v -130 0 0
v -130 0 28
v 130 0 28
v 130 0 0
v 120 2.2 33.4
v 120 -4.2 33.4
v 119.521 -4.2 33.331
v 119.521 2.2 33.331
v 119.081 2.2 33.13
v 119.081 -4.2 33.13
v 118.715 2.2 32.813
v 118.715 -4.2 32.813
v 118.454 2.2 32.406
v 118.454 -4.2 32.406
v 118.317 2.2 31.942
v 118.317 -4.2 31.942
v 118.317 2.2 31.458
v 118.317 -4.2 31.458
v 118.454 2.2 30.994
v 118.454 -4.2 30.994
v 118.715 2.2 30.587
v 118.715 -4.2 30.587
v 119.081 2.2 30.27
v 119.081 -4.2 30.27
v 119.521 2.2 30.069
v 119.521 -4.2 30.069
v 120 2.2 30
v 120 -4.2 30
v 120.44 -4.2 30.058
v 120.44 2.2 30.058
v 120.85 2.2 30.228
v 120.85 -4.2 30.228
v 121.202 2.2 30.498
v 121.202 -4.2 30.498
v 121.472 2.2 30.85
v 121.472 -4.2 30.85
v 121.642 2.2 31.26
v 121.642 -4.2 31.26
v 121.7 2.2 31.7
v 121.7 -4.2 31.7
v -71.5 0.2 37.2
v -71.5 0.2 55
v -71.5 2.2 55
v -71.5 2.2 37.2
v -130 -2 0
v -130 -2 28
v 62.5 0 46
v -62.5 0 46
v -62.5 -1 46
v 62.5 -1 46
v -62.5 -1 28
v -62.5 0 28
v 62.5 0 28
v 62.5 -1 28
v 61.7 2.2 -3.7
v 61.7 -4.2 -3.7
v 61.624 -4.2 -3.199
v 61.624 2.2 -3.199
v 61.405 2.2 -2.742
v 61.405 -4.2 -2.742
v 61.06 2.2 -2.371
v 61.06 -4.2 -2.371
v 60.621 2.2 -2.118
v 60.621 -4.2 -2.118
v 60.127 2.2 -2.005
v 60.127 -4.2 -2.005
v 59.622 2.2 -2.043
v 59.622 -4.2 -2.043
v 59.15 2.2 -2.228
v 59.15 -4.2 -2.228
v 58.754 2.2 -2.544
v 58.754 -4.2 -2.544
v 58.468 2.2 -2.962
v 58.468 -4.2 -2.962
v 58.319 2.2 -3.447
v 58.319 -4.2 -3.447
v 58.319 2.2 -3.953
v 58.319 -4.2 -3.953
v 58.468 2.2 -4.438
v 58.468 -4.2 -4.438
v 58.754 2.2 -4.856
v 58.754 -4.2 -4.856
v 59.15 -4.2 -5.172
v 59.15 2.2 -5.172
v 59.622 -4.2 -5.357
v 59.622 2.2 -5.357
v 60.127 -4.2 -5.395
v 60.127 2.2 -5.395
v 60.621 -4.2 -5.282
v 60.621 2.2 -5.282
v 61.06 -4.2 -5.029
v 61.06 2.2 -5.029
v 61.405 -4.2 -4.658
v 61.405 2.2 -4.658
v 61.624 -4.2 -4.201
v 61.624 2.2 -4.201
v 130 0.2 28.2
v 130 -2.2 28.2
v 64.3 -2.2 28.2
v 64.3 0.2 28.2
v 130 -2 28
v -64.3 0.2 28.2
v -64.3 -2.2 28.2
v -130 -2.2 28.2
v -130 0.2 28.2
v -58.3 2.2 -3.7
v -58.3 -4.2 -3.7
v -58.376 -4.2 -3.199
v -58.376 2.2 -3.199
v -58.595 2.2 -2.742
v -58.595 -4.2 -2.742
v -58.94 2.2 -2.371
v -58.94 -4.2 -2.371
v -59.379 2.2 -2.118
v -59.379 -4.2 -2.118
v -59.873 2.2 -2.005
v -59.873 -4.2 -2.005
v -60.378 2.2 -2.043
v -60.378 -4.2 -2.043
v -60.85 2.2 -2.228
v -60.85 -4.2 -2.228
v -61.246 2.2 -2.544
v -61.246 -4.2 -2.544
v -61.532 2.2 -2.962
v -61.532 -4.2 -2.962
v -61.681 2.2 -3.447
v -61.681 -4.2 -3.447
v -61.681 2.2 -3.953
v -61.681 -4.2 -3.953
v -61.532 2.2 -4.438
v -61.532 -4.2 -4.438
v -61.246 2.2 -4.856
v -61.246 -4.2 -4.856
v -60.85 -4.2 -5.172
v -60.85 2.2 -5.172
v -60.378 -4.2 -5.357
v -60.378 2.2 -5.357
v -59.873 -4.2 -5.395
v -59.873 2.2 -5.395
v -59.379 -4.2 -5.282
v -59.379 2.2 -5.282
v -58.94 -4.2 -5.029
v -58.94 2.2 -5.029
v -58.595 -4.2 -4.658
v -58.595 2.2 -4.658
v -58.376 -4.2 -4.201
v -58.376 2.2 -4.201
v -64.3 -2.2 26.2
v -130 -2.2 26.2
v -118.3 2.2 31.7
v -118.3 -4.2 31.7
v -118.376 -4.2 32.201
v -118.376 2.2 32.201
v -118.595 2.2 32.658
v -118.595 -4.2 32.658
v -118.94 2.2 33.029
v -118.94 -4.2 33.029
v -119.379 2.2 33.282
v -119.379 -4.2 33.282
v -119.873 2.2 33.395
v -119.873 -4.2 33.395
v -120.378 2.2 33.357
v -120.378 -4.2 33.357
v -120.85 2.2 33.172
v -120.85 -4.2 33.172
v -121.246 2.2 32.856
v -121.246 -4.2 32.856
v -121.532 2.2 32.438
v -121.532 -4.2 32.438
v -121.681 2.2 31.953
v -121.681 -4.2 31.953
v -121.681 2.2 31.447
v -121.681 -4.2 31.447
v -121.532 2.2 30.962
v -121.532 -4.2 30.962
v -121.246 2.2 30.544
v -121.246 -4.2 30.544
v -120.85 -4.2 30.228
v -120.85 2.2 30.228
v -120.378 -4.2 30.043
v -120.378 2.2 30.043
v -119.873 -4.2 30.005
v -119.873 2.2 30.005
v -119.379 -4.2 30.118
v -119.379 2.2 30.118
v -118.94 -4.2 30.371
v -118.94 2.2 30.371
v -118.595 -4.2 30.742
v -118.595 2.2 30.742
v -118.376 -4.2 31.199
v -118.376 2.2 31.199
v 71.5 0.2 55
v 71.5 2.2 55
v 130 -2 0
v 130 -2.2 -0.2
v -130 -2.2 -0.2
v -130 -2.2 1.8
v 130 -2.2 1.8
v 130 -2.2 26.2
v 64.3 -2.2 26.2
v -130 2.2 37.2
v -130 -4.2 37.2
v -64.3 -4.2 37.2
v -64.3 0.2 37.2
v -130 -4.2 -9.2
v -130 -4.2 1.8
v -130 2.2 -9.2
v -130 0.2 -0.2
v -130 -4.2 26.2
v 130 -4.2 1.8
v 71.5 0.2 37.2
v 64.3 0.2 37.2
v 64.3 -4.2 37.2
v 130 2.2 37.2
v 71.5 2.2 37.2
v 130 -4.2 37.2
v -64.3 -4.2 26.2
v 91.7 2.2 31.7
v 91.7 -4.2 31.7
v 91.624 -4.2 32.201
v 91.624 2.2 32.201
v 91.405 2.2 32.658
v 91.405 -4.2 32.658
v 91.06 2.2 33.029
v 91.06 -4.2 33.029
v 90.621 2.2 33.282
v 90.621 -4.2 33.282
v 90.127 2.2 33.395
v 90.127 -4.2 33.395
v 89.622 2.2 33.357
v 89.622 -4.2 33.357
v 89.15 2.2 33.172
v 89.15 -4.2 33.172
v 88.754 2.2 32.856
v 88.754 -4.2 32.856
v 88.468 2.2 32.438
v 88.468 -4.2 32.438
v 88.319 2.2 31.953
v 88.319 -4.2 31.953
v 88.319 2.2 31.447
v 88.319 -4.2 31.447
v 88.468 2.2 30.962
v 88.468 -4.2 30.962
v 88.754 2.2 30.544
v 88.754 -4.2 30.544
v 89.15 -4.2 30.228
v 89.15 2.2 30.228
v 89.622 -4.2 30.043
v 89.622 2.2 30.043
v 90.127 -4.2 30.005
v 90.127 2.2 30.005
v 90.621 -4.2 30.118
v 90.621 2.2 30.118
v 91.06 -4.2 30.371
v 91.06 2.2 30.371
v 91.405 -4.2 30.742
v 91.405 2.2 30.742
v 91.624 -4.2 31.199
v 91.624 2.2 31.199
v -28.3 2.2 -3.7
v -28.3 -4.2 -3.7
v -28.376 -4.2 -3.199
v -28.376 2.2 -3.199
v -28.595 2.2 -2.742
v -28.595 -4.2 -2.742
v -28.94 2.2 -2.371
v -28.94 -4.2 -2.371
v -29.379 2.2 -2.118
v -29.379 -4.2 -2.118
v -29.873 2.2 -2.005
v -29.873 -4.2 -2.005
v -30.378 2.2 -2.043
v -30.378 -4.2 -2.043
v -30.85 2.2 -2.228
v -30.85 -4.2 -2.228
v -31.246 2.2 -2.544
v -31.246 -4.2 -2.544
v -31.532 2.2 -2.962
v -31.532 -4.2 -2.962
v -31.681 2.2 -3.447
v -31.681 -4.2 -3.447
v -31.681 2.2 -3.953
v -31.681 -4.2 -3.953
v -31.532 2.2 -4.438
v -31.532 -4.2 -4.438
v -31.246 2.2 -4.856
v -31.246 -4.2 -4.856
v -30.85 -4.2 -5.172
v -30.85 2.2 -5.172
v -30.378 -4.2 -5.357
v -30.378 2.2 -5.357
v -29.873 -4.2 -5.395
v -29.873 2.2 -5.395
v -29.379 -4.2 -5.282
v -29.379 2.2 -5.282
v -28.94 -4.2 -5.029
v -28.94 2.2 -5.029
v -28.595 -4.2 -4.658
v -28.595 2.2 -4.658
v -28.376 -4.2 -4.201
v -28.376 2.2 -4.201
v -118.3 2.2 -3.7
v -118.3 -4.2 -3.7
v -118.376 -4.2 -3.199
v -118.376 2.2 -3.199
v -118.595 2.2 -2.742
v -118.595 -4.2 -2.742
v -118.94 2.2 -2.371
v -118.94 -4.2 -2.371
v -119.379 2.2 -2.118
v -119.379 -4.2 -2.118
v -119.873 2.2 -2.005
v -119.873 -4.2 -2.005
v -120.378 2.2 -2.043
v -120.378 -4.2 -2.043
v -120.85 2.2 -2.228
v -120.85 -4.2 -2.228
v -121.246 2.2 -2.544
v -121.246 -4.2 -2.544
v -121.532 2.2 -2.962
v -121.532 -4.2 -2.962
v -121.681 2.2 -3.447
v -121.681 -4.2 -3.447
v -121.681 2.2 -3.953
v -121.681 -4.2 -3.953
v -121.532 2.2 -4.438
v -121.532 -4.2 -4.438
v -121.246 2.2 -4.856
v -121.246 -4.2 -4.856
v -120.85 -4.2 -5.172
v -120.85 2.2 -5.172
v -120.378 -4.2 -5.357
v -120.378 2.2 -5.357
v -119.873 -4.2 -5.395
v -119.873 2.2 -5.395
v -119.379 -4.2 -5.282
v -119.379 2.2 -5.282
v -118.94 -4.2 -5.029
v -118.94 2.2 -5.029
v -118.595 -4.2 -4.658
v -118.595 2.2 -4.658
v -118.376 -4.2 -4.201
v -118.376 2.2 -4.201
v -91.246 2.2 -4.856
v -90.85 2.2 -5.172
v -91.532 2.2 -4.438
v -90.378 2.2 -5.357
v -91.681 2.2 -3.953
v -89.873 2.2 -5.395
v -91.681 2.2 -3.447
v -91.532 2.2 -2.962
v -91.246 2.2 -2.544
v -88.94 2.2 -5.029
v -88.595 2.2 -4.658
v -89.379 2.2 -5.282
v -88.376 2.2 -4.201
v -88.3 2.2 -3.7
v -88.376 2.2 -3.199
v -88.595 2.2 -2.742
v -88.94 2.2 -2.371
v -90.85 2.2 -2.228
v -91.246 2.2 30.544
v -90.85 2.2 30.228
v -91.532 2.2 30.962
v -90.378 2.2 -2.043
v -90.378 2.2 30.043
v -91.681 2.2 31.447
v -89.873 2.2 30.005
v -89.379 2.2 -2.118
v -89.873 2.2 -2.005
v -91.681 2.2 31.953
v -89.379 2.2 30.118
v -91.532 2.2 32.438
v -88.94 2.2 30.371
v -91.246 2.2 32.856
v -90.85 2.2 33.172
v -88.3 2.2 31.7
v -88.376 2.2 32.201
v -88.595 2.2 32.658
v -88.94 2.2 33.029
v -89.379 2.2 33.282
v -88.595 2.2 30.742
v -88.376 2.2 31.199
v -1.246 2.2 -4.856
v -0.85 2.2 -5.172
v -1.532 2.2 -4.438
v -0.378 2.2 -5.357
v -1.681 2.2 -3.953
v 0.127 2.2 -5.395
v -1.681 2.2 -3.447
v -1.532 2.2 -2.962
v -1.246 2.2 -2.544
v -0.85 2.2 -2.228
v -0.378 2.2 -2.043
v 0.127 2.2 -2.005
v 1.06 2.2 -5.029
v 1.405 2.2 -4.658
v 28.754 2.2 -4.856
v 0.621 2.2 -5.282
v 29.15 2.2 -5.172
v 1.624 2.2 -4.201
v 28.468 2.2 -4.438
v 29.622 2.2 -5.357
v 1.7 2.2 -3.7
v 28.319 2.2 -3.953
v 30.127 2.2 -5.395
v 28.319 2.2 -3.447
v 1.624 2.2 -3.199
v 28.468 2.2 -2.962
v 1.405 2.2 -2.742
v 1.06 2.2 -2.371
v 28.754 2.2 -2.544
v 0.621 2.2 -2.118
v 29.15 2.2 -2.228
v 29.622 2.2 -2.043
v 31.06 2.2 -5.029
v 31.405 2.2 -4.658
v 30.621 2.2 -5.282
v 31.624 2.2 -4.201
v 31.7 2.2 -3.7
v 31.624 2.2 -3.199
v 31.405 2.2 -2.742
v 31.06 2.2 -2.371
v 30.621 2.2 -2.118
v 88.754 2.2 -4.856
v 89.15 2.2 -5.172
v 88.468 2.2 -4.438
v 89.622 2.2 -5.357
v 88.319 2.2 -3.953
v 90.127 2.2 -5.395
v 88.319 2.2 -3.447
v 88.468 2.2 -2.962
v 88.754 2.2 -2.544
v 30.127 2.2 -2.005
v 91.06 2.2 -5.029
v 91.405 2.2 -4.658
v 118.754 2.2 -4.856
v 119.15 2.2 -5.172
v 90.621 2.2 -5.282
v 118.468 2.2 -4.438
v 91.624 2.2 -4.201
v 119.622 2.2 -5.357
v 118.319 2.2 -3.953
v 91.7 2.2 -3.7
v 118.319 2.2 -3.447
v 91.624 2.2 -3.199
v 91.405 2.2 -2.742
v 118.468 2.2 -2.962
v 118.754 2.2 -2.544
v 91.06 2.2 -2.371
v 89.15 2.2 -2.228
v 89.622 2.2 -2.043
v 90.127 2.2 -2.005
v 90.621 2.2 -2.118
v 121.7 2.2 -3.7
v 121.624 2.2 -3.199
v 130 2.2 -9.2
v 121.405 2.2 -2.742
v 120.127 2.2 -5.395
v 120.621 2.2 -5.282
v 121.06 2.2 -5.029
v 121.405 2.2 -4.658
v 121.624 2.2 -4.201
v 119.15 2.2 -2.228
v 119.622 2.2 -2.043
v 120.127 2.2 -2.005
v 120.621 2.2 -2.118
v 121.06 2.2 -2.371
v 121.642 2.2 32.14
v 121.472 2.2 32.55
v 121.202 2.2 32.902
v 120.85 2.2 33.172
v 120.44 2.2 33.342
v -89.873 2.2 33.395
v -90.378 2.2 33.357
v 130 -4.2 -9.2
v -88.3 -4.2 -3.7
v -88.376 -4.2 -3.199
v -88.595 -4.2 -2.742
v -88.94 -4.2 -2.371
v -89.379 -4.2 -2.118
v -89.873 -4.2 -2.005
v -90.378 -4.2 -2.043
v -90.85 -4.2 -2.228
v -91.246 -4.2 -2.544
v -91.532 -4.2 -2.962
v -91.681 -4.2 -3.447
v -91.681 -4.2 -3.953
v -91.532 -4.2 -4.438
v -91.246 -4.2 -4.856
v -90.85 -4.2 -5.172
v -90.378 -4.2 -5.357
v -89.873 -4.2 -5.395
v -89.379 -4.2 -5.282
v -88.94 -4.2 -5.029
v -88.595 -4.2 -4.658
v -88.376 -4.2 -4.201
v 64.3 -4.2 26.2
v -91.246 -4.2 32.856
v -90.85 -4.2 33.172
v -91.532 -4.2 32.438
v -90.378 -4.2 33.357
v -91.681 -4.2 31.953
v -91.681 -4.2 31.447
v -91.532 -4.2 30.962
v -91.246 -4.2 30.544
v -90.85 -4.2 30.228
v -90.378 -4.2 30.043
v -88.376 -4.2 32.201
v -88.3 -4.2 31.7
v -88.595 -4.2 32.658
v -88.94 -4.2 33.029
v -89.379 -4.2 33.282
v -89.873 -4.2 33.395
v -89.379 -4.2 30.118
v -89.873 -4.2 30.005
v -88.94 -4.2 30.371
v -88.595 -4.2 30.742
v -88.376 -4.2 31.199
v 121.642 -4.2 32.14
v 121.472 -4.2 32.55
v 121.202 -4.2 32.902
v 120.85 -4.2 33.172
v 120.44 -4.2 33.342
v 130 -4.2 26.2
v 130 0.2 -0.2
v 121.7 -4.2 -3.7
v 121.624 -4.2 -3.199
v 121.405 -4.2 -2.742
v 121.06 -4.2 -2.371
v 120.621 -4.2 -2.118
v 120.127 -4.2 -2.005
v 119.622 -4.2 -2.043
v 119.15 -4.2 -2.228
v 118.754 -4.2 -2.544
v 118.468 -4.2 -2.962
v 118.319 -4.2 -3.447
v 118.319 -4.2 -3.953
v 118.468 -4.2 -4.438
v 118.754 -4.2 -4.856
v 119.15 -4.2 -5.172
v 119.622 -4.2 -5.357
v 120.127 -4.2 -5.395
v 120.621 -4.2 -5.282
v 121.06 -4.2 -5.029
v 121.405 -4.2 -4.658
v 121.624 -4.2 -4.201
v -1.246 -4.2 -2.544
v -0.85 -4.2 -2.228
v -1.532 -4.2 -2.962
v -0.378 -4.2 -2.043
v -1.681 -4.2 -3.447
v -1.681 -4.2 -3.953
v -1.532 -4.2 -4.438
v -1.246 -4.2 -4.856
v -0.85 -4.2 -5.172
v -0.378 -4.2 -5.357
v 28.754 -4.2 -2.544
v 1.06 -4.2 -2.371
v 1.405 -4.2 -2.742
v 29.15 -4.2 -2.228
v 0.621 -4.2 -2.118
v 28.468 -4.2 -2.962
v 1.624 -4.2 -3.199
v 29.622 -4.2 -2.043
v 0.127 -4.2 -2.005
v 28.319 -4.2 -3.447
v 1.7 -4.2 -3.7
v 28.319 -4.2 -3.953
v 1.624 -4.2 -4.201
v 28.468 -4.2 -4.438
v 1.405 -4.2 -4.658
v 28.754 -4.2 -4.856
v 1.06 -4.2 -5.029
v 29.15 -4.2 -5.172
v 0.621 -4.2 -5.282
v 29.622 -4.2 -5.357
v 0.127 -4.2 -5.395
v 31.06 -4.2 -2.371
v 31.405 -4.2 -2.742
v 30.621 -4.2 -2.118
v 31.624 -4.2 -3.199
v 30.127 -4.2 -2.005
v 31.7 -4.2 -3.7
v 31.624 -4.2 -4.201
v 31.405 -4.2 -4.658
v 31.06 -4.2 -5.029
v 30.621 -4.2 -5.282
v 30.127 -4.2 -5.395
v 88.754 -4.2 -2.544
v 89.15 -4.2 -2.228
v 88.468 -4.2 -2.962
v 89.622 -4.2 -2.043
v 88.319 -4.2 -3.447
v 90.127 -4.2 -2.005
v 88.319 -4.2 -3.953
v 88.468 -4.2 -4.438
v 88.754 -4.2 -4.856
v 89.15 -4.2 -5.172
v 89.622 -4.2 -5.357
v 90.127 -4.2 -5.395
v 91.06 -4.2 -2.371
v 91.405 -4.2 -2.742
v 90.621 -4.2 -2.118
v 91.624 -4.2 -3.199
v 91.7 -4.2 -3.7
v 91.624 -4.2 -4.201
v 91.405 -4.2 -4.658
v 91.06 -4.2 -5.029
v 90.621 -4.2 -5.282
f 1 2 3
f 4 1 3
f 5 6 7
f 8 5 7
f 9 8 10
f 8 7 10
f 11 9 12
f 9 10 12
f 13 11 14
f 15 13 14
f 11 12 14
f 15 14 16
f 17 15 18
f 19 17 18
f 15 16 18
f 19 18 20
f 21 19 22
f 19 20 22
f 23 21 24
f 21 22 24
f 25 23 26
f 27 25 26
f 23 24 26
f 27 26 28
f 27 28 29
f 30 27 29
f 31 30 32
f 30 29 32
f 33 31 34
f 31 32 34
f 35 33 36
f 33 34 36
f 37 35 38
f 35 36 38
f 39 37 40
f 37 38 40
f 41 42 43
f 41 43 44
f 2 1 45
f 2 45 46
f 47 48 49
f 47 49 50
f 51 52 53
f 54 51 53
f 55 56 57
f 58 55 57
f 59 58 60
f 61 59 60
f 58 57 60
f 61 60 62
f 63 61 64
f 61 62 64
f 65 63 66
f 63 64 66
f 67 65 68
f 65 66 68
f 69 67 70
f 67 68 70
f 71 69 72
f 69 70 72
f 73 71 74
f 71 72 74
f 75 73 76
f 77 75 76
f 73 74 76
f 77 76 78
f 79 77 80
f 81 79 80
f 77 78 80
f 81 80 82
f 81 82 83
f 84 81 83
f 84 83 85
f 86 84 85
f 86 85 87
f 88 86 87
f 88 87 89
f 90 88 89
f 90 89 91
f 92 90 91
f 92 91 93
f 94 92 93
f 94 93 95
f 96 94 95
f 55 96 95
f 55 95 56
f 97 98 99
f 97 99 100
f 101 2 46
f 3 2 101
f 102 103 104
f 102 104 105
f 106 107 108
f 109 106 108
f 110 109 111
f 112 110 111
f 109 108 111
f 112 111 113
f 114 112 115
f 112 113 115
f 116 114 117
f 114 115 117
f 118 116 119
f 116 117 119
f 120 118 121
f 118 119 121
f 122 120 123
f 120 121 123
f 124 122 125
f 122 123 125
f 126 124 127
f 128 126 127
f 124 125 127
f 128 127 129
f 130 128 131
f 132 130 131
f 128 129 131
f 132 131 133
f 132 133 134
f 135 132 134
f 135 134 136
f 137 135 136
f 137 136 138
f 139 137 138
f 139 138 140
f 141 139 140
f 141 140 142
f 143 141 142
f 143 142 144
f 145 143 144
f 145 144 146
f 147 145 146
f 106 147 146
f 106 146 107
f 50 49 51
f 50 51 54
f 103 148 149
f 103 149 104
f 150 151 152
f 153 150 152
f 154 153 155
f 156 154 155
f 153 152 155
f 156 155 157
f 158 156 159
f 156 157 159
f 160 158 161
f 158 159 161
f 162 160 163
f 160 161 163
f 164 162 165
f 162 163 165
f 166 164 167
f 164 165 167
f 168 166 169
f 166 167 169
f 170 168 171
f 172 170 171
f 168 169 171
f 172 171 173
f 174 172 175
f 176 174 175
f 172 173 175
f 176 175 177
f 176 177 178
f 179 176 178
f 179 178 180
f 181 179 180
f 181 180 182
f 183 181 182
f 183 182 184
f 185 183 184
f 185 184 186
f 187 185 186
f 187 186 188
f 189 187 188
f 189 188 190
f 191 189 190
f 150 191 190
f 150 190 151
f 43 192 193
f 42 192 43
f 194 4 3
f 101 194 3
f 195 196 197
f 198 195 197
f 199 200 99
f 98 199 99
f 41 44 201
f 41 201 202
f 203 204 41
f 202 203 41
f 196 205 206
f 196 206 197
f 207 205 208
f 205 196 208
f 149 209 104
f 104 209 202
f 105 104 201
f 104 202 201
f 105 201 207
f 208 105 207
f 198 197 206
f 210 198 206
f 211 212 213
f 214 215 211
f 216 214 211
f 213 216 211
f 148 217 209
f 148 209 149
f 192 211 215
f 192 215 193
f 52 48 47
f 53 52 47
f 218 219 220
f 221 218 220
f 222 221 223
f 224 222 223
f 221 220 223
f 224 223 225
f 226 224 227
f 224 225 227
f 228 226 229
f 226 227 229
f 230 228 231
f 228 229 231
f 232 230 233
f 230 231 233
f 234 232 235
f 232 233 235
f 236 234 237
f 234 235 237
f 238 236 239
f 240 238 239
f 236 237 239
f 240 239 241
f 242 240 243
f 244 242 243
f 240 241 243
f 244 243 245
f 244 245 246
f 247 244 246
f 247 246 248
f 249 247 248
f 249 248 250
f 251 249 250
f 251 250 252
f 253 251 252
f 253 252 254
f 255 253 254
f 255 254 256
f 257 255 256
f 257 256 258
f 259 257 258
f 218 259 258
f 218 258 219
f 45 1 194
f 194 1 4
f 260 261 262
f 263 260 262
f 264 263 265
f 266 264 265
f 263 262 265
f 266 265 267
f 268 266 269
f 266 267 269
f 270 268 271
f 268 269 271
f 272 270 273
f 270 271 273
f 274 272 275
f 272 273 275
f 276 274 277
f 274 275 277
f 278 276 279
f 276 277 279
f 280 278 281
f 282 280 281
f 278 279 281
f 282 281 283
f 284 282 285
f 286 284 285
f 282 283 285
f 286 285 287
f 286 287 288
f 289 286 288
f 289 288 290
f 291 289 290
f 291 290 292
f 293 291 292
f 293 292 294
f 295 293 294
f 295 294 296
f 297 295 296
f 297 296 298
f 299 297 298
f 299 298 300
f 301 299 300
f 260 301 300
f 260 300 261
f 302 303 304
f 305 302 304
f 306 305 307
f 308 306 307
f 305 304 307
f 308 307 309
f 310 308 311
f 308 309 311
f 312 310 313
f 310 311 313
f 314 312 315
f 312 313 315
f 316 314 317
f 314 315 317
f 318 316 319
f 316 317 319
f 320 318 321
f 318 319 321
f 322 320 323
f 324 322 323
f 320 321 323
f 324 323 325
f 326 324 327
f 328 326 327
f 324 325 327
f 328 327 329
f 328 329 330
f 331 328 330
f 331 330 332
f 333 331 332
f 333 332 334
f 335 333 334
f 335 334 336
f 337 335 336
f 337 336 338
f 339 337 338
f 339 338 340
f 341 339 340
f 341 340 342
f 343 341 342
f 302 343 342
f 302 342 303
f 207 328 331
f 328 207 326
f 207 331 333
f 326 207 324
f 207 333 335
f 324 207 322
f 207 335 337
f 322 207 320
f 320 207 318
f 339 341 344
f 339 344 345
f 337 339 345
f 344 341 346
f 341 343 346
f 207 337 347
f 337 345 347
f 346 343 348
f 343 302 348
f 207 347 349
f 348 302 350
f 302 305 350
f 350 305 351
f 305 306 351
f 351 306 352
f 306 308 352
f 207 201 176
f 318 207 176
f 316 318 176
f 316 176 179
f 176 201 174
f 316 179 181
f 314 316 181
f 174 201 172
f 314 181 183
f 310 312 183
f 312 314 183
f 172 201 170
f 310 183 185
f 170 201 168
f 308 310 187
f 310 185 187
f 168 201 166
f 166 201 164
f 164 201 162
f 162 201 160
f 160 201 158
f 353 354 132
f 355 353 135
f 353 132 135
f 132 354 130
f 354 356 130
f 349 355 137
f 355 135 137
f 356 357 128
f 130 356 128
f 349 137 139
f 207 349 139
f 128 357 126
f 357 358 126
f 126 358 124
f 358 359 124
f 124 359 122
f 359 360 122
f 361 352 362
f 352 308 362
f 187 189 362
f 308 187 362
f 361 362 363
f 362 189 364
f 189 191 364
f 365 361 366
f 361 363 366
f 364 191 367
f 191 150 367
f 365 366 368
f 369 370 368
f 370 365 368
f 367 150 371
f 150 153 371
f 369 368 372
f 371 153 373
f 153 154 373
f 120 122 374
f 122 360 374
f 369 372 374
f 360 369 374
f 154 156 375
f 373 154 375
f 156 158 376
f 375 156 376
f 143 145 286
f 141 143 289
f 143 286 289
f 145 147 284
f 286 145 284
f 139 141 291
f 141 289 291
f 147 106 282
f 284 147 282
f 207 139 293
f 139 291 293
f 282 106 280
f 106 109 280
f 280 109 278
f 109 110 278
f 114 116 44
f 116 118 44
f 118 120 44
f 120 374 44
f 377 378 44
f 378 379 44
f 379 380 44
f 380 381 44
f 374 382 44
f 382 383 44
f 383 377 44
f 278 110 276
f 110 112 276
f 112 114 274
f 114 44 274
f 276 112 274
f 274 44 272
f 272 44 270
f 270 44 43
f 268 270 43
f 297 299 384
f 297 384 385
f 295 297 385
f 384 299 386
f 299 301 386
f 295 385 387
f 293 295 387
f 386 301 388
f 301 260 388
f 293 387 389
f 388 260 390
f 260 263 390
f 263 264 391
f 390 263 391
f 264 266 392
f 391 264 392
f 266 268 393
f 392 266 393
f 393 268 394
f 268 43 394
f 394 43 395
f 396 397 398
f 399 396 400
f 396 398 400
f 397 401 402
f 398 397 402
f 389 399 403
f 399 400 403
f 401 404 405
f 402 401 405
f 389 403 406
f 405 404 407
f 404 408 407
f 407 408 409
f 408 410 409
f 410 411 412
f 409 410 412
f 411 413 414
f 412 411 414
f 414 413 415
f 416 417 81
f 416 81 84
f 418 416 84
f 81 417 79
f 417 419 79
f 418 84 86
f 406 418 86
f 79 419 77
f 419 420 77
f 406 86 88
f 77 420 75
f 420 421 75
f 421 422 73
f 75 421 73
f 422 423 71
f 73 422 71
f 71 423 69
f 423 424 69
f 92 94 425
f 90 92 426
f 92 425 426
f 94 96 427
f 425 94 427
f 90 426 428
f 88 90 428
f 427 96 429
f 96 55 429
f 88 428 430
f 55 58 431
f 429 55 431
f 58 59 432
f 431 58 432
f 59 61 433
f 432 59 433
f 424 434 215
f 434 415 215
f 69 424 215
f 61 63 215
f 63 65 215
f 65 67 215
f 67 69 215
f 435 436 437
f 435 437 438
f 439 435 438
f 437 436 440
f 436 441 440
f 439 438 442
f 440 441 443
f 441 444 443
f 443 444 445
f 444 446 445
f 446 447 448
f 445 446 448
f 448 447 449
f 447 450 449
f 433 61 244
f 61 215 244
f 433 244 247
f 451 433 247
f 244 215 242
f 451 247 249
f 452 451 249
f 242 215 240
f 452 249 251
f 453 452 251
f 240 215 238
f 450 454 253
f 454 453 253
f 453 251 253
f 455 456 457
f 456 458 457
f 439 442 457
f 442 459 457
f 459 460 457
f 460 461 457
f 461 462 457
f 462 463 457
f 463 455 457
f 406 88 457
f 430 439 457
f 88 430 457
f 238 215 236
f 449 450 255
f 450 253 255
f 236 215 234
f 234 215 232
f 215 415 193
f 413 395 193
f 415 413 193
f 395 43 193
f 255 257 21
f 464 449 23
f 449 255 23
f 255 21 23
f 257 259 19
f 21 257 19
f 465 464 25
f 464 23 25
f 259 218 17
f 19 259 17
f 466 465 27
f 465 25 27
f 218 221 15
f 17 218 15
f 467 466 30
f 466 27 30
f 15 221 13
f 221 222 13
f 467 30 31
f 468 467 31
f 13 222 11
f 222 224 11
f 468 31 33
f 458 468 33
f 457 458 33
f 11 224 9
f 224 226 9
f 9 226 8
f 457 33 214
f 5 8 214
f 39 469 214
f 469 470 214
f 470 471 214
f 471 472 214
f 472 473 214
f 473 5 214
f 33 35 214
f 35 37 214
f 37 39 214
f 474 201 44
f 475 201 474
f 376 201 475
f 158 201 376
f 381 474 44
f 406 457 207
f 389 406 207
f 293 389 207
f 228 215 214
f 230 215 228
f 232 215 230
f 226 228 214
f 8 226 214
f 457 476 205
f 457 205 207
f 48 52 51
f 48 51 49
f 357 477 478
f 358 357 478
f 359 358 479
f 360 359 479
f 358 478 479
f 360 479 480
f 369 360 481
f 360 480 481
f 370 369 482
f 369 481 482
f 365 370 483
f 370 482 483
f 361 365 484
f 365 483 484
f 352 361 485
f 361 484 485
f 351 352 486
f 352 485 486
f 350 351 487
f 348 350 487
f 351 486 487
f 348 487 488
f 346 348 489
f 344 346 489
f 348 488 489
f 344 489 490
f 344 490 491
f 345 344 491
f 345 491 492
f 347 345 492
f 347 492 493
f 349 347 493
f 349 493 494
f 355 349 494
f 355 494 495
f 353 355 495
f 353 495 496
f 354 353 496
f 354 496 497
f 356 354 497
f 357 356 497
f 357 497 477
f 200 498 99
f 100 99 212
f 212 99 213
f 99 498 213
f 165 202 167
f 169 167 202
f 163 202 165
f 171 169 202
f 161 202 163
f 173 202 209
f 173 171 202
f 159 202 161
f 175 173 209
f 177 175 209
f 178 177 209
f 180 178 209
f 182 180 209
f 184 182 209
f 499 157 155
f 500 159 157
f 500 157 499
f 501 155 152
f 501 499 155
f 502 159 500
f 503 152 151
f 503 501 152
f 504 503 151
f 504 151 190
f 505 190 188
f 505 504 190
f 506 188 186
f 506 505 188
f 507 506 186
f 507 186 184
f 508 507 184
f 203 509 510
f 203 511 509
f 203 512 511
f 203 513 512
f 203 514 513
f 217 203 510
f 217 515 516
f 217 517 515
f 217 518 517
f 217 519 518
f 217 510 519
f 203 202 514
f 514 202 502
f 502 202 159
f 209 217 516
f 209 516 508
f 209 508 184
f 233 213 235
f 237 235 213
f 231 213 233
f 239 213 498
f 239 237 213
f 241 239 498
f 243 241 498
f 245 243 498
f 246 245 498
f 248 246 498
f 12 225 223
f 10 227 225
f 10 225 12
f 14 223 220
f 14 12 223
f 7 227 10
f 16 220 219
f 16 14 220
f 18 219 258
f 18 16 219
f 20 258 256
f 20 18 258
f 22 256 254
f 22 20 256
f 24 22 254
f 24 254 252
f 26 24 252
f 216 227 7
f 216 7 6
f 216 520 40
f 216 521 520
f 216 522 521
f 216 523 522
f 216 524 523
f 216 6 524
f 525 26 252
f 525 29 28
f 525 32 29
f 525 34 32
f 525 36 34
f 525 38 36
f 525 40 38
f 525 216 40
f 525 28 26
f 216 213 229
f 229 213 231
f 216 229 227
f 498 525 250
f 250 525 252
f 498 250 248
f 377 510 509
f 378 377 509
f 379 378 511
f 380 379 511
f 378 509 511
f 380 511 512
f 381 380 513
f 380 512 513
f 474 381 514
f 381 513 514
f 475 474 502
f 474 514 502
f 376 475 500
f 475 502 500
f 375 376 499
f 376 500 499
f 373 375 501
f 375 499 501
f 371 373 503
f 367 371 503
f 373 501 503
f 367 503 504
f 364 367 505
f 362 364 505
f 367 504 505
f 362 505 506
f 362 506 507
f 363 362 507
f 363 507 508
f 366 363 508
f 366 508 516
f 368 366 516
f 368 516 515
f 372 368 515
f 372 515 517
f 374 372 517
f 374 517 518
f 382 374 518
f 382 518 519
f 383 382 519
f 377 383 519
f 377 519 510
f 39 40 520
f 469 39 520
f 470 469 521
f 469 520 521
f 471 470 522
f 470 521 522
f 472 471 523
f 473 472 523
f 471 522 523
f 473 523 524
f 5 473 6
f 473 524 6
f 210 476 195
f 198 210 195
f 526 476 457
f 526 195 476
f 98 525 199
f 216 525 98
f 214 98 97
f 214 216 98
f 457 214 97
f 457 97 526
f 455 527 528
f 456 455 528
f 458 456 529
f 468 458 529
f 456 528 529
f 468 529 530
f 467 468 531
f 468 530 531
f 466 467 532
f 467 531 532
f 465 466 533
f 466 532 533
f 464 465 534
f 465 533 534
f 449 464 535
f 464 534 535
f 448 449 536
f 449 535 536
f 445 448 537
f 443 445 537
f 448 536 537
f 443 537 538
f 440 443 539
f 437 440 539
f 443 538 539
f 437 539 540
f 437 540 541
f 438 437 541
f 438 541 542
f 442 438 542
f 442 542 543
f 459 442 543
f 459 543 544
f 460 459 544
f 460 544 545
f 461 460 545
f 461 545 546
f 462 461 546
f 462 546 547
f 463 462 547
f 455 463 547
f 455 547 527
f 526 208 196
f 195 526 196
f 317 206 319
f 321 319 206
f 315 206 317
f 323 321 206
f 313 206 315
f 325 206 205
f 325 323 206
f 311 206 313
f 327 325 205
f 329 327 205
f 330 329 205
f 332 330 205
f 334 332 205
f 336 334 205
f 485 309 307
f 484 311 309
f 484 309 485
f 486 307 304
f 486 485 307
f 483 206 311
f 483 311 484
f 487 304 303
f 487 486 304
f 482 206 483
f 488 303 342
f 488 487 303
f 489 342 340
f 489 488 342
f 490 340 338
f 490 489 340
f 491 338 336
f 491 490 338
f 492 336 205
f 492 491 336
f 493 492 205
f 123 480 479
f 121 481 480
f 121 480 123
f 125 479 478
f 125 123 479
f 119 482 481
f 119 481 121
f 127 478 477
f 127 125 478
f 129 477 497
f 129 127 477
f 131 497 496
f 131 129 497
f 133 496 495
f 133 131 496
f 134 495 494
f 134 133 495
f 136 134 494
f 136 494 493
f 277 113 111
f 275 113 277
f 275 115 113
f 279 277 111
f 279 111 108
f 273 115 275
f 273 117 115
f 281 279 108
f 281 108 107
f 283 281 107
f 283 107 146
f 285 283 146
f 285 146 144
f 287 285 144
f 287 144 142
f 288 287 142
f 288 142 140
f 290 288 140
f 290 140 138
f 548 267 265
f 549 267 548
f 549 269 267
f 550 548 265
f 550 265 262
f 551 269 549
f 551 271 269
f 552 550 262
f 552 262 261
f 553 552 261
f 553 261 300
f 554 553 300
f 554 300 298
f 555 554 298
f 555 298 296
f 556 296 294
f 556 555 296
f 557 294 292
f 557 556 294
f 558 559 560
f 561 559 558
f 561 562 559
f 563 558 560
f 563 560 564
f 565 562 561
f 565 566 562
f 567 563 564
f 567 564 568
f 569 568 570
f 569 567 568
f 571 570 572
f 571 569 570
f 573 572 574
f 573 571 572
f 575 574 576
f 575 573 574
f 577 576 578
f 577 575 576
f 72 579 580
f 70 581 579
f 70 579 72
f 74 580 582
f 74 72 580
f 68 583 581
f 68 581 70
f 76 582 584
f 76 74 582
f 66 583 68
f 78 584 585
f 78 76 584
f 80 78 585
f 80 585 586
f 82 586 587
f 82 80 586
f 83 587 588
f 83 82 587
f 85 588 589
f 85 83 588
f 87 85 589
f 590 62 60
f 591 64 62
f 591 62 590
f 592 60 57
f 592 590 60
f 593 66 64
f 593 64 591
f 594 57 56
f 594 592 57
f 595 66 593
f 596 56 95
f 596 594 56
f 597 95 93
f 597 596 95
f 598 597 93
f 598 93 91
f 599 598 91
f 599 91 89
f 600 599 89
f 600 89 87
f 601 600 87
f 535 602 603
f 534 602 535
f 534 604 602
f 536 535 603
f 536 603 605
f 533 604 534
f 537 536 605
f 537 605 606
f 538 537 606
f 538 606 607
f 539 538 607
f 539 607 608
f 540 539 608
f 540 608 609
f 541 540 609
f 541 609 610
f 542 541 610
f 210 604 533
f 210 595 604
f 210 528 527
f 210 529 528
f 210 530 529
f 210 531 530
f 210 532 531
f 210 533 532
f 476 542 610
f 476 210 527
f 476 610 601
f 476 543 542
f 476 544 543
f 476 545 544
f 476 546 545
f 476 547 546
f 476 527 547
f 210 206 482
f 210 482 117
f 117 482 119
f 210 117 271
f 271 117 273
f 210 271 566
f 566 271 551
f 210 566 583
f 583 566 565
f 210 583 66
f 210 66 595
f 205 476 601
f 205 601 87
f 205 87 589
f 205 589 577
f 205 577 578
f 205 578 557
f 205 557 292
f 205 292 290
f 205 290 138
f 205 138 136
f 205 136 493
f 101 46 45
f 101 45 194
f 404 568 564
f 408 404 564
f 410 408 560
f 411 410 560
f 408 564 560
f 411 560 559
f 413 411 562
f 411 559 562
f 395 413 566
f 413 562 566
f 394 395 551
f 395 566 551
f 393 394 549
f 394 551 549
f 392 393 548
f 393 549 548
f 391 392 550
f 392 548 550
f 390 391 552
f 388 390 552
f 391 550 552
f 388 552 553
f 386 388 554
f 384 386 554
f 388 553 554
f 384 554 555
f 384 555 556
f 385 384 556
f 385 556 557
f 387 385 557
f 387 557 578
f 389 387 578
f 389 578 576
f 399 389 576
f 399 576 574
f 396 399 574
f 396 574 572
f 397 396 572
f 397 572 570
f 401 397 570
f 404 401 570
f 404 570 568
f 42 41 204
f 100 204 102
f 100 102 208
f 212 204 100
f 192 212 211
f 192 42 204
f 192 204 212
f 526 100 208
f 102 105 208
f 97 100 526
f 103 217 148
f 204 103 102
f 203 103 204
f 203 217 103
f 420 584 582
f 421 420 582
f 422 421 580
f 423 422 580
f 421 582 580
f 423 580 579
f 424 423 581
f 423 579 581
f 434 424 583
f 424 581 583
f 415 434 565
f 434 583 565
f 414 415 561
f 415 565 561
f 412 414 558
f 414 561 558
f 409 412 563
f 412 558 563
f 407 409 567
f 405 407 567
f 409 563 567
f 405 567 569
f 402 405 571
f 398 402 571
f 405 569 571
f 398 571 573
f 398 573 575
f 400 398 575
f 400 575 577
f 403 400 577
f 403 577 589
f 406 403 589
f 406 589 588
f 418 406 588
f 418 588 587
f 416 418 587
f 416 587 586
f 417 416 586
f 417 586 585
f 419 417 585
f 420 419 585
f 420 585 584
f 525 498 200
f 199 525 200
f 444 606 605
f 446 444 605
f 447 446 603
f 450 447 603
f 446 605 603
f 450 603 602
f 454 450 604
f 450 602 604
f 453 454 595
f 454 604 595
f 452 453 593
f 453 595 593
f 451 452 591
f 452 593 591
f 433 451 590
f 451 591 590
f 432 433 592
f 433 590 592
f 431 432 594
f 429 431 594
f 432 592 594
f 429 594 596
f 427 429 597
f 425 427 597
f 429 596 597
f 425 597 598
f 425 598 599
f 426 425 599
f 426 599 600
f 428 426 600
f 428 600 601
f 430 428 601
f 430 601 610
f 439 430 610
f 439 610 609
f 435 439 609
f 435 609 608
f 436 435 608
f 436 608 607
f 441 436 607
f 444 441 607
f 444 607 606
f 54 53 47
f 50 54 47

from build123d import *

# Parameters (mm, degrees)
F0_W      = 260
F0_H      = 28
F1_DEPTH  = 2
F2_W      = 125
F2_H      = 18
F3_DEPTH  = 1
F5_DEPTH  = 130
F6_R      = 1.7
F7_DEPTH  = 6.401
F8_W      = 128.6
F8_H      = 21.6
F9_DEPTH  = 6.401
F11_DEPTH = 2


with BuildPart() as f1:
    # F0 (on Front) → F1 (new body)
    with BuildSketch(Plane.XZ):
        with Locations((0, 14)):
            Rectangle(F0_W, F0_H)
    extrude(amount=F1_DEPTH)


with BuildPart() as f3:
    # F2 (on Front) → F3 (new body)
    with BuildSketch(Plane.XZ):
        with Locations((0, 37)):
            Rectangle(F2_W, F2_H)
    extrude(amount=F3_DEPTH)


with BuildPart() as f5:
    # F4 (on Right) → F5 (new body, symmetric)
    with BuildSketch(Plane.YZ):
        Polygon((-2.2, -0.2), (-2.2, 1.8), (-4.2, 1.8), (-4.2, -9.2), (2.2, -9.2), (2.2, 37.2), (-4.2, 37.2), (-4.2, 26.2), (-2.2, 26.2), (-2.2, 28.2), (0.2, 28.2), (0.2, -0.2), align=None)
    extrude(amount=F5_DEPTH, both=True)

    # F6 (on face) → F7 (cut, through all)
    with BuildSketch(Plane.XZ.offset(4.2)):
        with Locations((-120, -3.7)):
            Circle(F6_R)
        with Locations((-120, 31.7)):
            Circle(F6_R)
        with Locations((-90, -3.7)):
            Circle(F6_R)
        with Locations((-90, 31.7)):
            Circle(F6_R)
        with Locations((-60, -3.7)):
            Circle(F6_R)
        with Locations((-60, 31.7)):
            Circle(F6_R)
        with Locations((-30, -3.7)):
            Circle(F6_R)
        with Locations((-30, 31.7)):
            Circle(F6_R)
        with Locations((0, -3.7)):
            Circle(F6_R)
        with Locations((0, 31.7)):
            Circle(F6_R)
        with Locations((30, -3.7)):
            Circle(F6_R)
        with Locations((30, 31.7)):
            Circle(F6_R)
        with Locations((60, -3.7)):
            Circle(F6_R)
        with Locations((60, 31.7)):
            Circle(F6_R)
        with Locations((90, -3.7)):
            Circle(F6_R)
        with Locations((90, 31.7)):
            Circle(F6_R)
        with Locations((120, -3.7)):
            Circle(F6_R)
        with BuildLine():
            ThreePointArc((120, 30), (121.202081528, 30.497918472), (121.7, 31.7))
            ThreePointArc((121.7, 31.7), (121.202081528, 32.902081528), (120, 33.4))
            Line((120, 33.4), (120, 31.7))
            Line((120, 31.7), (120, 30))
        make_face()
        with BuildLine():
            Line((120, 31.7), (120, 33.4))
            ThreePointArc((120, 33.4), (118.3, 31.7), (120, 30))
            Line((120, 30), (120, 31.7))
        make_face()
    extrude(amount=-F7_DEPTH, mode=Mode.SUBTRACT)

    # F8 (on face) → F9 (cut, through all)
    with BuildSketch(Plane.XZ.offset(4.2)):
        with Locations((0, 37)):
            Rectangle(F8_W, F8_H)
    extrude(amount=-F9_DEPTH, mode=Mode.SUBTRACT)

    # F10 (on face) → F11 (join, through all)
    with BuildSketch(Plane.XZ.offset(-0.2)):
        Polygon((-71.5, 55), (-71.5, 37.2), (-64.3, 37.2), (-64.3, 26.2), (64.3, 26.2), (64.3, 37.2), (71.5, 37.2), (71.5, 55), align=None)
    extrude(amount=-F11_DEPTH)


solid = Compound([f1.part, f3.part, f5.part])
